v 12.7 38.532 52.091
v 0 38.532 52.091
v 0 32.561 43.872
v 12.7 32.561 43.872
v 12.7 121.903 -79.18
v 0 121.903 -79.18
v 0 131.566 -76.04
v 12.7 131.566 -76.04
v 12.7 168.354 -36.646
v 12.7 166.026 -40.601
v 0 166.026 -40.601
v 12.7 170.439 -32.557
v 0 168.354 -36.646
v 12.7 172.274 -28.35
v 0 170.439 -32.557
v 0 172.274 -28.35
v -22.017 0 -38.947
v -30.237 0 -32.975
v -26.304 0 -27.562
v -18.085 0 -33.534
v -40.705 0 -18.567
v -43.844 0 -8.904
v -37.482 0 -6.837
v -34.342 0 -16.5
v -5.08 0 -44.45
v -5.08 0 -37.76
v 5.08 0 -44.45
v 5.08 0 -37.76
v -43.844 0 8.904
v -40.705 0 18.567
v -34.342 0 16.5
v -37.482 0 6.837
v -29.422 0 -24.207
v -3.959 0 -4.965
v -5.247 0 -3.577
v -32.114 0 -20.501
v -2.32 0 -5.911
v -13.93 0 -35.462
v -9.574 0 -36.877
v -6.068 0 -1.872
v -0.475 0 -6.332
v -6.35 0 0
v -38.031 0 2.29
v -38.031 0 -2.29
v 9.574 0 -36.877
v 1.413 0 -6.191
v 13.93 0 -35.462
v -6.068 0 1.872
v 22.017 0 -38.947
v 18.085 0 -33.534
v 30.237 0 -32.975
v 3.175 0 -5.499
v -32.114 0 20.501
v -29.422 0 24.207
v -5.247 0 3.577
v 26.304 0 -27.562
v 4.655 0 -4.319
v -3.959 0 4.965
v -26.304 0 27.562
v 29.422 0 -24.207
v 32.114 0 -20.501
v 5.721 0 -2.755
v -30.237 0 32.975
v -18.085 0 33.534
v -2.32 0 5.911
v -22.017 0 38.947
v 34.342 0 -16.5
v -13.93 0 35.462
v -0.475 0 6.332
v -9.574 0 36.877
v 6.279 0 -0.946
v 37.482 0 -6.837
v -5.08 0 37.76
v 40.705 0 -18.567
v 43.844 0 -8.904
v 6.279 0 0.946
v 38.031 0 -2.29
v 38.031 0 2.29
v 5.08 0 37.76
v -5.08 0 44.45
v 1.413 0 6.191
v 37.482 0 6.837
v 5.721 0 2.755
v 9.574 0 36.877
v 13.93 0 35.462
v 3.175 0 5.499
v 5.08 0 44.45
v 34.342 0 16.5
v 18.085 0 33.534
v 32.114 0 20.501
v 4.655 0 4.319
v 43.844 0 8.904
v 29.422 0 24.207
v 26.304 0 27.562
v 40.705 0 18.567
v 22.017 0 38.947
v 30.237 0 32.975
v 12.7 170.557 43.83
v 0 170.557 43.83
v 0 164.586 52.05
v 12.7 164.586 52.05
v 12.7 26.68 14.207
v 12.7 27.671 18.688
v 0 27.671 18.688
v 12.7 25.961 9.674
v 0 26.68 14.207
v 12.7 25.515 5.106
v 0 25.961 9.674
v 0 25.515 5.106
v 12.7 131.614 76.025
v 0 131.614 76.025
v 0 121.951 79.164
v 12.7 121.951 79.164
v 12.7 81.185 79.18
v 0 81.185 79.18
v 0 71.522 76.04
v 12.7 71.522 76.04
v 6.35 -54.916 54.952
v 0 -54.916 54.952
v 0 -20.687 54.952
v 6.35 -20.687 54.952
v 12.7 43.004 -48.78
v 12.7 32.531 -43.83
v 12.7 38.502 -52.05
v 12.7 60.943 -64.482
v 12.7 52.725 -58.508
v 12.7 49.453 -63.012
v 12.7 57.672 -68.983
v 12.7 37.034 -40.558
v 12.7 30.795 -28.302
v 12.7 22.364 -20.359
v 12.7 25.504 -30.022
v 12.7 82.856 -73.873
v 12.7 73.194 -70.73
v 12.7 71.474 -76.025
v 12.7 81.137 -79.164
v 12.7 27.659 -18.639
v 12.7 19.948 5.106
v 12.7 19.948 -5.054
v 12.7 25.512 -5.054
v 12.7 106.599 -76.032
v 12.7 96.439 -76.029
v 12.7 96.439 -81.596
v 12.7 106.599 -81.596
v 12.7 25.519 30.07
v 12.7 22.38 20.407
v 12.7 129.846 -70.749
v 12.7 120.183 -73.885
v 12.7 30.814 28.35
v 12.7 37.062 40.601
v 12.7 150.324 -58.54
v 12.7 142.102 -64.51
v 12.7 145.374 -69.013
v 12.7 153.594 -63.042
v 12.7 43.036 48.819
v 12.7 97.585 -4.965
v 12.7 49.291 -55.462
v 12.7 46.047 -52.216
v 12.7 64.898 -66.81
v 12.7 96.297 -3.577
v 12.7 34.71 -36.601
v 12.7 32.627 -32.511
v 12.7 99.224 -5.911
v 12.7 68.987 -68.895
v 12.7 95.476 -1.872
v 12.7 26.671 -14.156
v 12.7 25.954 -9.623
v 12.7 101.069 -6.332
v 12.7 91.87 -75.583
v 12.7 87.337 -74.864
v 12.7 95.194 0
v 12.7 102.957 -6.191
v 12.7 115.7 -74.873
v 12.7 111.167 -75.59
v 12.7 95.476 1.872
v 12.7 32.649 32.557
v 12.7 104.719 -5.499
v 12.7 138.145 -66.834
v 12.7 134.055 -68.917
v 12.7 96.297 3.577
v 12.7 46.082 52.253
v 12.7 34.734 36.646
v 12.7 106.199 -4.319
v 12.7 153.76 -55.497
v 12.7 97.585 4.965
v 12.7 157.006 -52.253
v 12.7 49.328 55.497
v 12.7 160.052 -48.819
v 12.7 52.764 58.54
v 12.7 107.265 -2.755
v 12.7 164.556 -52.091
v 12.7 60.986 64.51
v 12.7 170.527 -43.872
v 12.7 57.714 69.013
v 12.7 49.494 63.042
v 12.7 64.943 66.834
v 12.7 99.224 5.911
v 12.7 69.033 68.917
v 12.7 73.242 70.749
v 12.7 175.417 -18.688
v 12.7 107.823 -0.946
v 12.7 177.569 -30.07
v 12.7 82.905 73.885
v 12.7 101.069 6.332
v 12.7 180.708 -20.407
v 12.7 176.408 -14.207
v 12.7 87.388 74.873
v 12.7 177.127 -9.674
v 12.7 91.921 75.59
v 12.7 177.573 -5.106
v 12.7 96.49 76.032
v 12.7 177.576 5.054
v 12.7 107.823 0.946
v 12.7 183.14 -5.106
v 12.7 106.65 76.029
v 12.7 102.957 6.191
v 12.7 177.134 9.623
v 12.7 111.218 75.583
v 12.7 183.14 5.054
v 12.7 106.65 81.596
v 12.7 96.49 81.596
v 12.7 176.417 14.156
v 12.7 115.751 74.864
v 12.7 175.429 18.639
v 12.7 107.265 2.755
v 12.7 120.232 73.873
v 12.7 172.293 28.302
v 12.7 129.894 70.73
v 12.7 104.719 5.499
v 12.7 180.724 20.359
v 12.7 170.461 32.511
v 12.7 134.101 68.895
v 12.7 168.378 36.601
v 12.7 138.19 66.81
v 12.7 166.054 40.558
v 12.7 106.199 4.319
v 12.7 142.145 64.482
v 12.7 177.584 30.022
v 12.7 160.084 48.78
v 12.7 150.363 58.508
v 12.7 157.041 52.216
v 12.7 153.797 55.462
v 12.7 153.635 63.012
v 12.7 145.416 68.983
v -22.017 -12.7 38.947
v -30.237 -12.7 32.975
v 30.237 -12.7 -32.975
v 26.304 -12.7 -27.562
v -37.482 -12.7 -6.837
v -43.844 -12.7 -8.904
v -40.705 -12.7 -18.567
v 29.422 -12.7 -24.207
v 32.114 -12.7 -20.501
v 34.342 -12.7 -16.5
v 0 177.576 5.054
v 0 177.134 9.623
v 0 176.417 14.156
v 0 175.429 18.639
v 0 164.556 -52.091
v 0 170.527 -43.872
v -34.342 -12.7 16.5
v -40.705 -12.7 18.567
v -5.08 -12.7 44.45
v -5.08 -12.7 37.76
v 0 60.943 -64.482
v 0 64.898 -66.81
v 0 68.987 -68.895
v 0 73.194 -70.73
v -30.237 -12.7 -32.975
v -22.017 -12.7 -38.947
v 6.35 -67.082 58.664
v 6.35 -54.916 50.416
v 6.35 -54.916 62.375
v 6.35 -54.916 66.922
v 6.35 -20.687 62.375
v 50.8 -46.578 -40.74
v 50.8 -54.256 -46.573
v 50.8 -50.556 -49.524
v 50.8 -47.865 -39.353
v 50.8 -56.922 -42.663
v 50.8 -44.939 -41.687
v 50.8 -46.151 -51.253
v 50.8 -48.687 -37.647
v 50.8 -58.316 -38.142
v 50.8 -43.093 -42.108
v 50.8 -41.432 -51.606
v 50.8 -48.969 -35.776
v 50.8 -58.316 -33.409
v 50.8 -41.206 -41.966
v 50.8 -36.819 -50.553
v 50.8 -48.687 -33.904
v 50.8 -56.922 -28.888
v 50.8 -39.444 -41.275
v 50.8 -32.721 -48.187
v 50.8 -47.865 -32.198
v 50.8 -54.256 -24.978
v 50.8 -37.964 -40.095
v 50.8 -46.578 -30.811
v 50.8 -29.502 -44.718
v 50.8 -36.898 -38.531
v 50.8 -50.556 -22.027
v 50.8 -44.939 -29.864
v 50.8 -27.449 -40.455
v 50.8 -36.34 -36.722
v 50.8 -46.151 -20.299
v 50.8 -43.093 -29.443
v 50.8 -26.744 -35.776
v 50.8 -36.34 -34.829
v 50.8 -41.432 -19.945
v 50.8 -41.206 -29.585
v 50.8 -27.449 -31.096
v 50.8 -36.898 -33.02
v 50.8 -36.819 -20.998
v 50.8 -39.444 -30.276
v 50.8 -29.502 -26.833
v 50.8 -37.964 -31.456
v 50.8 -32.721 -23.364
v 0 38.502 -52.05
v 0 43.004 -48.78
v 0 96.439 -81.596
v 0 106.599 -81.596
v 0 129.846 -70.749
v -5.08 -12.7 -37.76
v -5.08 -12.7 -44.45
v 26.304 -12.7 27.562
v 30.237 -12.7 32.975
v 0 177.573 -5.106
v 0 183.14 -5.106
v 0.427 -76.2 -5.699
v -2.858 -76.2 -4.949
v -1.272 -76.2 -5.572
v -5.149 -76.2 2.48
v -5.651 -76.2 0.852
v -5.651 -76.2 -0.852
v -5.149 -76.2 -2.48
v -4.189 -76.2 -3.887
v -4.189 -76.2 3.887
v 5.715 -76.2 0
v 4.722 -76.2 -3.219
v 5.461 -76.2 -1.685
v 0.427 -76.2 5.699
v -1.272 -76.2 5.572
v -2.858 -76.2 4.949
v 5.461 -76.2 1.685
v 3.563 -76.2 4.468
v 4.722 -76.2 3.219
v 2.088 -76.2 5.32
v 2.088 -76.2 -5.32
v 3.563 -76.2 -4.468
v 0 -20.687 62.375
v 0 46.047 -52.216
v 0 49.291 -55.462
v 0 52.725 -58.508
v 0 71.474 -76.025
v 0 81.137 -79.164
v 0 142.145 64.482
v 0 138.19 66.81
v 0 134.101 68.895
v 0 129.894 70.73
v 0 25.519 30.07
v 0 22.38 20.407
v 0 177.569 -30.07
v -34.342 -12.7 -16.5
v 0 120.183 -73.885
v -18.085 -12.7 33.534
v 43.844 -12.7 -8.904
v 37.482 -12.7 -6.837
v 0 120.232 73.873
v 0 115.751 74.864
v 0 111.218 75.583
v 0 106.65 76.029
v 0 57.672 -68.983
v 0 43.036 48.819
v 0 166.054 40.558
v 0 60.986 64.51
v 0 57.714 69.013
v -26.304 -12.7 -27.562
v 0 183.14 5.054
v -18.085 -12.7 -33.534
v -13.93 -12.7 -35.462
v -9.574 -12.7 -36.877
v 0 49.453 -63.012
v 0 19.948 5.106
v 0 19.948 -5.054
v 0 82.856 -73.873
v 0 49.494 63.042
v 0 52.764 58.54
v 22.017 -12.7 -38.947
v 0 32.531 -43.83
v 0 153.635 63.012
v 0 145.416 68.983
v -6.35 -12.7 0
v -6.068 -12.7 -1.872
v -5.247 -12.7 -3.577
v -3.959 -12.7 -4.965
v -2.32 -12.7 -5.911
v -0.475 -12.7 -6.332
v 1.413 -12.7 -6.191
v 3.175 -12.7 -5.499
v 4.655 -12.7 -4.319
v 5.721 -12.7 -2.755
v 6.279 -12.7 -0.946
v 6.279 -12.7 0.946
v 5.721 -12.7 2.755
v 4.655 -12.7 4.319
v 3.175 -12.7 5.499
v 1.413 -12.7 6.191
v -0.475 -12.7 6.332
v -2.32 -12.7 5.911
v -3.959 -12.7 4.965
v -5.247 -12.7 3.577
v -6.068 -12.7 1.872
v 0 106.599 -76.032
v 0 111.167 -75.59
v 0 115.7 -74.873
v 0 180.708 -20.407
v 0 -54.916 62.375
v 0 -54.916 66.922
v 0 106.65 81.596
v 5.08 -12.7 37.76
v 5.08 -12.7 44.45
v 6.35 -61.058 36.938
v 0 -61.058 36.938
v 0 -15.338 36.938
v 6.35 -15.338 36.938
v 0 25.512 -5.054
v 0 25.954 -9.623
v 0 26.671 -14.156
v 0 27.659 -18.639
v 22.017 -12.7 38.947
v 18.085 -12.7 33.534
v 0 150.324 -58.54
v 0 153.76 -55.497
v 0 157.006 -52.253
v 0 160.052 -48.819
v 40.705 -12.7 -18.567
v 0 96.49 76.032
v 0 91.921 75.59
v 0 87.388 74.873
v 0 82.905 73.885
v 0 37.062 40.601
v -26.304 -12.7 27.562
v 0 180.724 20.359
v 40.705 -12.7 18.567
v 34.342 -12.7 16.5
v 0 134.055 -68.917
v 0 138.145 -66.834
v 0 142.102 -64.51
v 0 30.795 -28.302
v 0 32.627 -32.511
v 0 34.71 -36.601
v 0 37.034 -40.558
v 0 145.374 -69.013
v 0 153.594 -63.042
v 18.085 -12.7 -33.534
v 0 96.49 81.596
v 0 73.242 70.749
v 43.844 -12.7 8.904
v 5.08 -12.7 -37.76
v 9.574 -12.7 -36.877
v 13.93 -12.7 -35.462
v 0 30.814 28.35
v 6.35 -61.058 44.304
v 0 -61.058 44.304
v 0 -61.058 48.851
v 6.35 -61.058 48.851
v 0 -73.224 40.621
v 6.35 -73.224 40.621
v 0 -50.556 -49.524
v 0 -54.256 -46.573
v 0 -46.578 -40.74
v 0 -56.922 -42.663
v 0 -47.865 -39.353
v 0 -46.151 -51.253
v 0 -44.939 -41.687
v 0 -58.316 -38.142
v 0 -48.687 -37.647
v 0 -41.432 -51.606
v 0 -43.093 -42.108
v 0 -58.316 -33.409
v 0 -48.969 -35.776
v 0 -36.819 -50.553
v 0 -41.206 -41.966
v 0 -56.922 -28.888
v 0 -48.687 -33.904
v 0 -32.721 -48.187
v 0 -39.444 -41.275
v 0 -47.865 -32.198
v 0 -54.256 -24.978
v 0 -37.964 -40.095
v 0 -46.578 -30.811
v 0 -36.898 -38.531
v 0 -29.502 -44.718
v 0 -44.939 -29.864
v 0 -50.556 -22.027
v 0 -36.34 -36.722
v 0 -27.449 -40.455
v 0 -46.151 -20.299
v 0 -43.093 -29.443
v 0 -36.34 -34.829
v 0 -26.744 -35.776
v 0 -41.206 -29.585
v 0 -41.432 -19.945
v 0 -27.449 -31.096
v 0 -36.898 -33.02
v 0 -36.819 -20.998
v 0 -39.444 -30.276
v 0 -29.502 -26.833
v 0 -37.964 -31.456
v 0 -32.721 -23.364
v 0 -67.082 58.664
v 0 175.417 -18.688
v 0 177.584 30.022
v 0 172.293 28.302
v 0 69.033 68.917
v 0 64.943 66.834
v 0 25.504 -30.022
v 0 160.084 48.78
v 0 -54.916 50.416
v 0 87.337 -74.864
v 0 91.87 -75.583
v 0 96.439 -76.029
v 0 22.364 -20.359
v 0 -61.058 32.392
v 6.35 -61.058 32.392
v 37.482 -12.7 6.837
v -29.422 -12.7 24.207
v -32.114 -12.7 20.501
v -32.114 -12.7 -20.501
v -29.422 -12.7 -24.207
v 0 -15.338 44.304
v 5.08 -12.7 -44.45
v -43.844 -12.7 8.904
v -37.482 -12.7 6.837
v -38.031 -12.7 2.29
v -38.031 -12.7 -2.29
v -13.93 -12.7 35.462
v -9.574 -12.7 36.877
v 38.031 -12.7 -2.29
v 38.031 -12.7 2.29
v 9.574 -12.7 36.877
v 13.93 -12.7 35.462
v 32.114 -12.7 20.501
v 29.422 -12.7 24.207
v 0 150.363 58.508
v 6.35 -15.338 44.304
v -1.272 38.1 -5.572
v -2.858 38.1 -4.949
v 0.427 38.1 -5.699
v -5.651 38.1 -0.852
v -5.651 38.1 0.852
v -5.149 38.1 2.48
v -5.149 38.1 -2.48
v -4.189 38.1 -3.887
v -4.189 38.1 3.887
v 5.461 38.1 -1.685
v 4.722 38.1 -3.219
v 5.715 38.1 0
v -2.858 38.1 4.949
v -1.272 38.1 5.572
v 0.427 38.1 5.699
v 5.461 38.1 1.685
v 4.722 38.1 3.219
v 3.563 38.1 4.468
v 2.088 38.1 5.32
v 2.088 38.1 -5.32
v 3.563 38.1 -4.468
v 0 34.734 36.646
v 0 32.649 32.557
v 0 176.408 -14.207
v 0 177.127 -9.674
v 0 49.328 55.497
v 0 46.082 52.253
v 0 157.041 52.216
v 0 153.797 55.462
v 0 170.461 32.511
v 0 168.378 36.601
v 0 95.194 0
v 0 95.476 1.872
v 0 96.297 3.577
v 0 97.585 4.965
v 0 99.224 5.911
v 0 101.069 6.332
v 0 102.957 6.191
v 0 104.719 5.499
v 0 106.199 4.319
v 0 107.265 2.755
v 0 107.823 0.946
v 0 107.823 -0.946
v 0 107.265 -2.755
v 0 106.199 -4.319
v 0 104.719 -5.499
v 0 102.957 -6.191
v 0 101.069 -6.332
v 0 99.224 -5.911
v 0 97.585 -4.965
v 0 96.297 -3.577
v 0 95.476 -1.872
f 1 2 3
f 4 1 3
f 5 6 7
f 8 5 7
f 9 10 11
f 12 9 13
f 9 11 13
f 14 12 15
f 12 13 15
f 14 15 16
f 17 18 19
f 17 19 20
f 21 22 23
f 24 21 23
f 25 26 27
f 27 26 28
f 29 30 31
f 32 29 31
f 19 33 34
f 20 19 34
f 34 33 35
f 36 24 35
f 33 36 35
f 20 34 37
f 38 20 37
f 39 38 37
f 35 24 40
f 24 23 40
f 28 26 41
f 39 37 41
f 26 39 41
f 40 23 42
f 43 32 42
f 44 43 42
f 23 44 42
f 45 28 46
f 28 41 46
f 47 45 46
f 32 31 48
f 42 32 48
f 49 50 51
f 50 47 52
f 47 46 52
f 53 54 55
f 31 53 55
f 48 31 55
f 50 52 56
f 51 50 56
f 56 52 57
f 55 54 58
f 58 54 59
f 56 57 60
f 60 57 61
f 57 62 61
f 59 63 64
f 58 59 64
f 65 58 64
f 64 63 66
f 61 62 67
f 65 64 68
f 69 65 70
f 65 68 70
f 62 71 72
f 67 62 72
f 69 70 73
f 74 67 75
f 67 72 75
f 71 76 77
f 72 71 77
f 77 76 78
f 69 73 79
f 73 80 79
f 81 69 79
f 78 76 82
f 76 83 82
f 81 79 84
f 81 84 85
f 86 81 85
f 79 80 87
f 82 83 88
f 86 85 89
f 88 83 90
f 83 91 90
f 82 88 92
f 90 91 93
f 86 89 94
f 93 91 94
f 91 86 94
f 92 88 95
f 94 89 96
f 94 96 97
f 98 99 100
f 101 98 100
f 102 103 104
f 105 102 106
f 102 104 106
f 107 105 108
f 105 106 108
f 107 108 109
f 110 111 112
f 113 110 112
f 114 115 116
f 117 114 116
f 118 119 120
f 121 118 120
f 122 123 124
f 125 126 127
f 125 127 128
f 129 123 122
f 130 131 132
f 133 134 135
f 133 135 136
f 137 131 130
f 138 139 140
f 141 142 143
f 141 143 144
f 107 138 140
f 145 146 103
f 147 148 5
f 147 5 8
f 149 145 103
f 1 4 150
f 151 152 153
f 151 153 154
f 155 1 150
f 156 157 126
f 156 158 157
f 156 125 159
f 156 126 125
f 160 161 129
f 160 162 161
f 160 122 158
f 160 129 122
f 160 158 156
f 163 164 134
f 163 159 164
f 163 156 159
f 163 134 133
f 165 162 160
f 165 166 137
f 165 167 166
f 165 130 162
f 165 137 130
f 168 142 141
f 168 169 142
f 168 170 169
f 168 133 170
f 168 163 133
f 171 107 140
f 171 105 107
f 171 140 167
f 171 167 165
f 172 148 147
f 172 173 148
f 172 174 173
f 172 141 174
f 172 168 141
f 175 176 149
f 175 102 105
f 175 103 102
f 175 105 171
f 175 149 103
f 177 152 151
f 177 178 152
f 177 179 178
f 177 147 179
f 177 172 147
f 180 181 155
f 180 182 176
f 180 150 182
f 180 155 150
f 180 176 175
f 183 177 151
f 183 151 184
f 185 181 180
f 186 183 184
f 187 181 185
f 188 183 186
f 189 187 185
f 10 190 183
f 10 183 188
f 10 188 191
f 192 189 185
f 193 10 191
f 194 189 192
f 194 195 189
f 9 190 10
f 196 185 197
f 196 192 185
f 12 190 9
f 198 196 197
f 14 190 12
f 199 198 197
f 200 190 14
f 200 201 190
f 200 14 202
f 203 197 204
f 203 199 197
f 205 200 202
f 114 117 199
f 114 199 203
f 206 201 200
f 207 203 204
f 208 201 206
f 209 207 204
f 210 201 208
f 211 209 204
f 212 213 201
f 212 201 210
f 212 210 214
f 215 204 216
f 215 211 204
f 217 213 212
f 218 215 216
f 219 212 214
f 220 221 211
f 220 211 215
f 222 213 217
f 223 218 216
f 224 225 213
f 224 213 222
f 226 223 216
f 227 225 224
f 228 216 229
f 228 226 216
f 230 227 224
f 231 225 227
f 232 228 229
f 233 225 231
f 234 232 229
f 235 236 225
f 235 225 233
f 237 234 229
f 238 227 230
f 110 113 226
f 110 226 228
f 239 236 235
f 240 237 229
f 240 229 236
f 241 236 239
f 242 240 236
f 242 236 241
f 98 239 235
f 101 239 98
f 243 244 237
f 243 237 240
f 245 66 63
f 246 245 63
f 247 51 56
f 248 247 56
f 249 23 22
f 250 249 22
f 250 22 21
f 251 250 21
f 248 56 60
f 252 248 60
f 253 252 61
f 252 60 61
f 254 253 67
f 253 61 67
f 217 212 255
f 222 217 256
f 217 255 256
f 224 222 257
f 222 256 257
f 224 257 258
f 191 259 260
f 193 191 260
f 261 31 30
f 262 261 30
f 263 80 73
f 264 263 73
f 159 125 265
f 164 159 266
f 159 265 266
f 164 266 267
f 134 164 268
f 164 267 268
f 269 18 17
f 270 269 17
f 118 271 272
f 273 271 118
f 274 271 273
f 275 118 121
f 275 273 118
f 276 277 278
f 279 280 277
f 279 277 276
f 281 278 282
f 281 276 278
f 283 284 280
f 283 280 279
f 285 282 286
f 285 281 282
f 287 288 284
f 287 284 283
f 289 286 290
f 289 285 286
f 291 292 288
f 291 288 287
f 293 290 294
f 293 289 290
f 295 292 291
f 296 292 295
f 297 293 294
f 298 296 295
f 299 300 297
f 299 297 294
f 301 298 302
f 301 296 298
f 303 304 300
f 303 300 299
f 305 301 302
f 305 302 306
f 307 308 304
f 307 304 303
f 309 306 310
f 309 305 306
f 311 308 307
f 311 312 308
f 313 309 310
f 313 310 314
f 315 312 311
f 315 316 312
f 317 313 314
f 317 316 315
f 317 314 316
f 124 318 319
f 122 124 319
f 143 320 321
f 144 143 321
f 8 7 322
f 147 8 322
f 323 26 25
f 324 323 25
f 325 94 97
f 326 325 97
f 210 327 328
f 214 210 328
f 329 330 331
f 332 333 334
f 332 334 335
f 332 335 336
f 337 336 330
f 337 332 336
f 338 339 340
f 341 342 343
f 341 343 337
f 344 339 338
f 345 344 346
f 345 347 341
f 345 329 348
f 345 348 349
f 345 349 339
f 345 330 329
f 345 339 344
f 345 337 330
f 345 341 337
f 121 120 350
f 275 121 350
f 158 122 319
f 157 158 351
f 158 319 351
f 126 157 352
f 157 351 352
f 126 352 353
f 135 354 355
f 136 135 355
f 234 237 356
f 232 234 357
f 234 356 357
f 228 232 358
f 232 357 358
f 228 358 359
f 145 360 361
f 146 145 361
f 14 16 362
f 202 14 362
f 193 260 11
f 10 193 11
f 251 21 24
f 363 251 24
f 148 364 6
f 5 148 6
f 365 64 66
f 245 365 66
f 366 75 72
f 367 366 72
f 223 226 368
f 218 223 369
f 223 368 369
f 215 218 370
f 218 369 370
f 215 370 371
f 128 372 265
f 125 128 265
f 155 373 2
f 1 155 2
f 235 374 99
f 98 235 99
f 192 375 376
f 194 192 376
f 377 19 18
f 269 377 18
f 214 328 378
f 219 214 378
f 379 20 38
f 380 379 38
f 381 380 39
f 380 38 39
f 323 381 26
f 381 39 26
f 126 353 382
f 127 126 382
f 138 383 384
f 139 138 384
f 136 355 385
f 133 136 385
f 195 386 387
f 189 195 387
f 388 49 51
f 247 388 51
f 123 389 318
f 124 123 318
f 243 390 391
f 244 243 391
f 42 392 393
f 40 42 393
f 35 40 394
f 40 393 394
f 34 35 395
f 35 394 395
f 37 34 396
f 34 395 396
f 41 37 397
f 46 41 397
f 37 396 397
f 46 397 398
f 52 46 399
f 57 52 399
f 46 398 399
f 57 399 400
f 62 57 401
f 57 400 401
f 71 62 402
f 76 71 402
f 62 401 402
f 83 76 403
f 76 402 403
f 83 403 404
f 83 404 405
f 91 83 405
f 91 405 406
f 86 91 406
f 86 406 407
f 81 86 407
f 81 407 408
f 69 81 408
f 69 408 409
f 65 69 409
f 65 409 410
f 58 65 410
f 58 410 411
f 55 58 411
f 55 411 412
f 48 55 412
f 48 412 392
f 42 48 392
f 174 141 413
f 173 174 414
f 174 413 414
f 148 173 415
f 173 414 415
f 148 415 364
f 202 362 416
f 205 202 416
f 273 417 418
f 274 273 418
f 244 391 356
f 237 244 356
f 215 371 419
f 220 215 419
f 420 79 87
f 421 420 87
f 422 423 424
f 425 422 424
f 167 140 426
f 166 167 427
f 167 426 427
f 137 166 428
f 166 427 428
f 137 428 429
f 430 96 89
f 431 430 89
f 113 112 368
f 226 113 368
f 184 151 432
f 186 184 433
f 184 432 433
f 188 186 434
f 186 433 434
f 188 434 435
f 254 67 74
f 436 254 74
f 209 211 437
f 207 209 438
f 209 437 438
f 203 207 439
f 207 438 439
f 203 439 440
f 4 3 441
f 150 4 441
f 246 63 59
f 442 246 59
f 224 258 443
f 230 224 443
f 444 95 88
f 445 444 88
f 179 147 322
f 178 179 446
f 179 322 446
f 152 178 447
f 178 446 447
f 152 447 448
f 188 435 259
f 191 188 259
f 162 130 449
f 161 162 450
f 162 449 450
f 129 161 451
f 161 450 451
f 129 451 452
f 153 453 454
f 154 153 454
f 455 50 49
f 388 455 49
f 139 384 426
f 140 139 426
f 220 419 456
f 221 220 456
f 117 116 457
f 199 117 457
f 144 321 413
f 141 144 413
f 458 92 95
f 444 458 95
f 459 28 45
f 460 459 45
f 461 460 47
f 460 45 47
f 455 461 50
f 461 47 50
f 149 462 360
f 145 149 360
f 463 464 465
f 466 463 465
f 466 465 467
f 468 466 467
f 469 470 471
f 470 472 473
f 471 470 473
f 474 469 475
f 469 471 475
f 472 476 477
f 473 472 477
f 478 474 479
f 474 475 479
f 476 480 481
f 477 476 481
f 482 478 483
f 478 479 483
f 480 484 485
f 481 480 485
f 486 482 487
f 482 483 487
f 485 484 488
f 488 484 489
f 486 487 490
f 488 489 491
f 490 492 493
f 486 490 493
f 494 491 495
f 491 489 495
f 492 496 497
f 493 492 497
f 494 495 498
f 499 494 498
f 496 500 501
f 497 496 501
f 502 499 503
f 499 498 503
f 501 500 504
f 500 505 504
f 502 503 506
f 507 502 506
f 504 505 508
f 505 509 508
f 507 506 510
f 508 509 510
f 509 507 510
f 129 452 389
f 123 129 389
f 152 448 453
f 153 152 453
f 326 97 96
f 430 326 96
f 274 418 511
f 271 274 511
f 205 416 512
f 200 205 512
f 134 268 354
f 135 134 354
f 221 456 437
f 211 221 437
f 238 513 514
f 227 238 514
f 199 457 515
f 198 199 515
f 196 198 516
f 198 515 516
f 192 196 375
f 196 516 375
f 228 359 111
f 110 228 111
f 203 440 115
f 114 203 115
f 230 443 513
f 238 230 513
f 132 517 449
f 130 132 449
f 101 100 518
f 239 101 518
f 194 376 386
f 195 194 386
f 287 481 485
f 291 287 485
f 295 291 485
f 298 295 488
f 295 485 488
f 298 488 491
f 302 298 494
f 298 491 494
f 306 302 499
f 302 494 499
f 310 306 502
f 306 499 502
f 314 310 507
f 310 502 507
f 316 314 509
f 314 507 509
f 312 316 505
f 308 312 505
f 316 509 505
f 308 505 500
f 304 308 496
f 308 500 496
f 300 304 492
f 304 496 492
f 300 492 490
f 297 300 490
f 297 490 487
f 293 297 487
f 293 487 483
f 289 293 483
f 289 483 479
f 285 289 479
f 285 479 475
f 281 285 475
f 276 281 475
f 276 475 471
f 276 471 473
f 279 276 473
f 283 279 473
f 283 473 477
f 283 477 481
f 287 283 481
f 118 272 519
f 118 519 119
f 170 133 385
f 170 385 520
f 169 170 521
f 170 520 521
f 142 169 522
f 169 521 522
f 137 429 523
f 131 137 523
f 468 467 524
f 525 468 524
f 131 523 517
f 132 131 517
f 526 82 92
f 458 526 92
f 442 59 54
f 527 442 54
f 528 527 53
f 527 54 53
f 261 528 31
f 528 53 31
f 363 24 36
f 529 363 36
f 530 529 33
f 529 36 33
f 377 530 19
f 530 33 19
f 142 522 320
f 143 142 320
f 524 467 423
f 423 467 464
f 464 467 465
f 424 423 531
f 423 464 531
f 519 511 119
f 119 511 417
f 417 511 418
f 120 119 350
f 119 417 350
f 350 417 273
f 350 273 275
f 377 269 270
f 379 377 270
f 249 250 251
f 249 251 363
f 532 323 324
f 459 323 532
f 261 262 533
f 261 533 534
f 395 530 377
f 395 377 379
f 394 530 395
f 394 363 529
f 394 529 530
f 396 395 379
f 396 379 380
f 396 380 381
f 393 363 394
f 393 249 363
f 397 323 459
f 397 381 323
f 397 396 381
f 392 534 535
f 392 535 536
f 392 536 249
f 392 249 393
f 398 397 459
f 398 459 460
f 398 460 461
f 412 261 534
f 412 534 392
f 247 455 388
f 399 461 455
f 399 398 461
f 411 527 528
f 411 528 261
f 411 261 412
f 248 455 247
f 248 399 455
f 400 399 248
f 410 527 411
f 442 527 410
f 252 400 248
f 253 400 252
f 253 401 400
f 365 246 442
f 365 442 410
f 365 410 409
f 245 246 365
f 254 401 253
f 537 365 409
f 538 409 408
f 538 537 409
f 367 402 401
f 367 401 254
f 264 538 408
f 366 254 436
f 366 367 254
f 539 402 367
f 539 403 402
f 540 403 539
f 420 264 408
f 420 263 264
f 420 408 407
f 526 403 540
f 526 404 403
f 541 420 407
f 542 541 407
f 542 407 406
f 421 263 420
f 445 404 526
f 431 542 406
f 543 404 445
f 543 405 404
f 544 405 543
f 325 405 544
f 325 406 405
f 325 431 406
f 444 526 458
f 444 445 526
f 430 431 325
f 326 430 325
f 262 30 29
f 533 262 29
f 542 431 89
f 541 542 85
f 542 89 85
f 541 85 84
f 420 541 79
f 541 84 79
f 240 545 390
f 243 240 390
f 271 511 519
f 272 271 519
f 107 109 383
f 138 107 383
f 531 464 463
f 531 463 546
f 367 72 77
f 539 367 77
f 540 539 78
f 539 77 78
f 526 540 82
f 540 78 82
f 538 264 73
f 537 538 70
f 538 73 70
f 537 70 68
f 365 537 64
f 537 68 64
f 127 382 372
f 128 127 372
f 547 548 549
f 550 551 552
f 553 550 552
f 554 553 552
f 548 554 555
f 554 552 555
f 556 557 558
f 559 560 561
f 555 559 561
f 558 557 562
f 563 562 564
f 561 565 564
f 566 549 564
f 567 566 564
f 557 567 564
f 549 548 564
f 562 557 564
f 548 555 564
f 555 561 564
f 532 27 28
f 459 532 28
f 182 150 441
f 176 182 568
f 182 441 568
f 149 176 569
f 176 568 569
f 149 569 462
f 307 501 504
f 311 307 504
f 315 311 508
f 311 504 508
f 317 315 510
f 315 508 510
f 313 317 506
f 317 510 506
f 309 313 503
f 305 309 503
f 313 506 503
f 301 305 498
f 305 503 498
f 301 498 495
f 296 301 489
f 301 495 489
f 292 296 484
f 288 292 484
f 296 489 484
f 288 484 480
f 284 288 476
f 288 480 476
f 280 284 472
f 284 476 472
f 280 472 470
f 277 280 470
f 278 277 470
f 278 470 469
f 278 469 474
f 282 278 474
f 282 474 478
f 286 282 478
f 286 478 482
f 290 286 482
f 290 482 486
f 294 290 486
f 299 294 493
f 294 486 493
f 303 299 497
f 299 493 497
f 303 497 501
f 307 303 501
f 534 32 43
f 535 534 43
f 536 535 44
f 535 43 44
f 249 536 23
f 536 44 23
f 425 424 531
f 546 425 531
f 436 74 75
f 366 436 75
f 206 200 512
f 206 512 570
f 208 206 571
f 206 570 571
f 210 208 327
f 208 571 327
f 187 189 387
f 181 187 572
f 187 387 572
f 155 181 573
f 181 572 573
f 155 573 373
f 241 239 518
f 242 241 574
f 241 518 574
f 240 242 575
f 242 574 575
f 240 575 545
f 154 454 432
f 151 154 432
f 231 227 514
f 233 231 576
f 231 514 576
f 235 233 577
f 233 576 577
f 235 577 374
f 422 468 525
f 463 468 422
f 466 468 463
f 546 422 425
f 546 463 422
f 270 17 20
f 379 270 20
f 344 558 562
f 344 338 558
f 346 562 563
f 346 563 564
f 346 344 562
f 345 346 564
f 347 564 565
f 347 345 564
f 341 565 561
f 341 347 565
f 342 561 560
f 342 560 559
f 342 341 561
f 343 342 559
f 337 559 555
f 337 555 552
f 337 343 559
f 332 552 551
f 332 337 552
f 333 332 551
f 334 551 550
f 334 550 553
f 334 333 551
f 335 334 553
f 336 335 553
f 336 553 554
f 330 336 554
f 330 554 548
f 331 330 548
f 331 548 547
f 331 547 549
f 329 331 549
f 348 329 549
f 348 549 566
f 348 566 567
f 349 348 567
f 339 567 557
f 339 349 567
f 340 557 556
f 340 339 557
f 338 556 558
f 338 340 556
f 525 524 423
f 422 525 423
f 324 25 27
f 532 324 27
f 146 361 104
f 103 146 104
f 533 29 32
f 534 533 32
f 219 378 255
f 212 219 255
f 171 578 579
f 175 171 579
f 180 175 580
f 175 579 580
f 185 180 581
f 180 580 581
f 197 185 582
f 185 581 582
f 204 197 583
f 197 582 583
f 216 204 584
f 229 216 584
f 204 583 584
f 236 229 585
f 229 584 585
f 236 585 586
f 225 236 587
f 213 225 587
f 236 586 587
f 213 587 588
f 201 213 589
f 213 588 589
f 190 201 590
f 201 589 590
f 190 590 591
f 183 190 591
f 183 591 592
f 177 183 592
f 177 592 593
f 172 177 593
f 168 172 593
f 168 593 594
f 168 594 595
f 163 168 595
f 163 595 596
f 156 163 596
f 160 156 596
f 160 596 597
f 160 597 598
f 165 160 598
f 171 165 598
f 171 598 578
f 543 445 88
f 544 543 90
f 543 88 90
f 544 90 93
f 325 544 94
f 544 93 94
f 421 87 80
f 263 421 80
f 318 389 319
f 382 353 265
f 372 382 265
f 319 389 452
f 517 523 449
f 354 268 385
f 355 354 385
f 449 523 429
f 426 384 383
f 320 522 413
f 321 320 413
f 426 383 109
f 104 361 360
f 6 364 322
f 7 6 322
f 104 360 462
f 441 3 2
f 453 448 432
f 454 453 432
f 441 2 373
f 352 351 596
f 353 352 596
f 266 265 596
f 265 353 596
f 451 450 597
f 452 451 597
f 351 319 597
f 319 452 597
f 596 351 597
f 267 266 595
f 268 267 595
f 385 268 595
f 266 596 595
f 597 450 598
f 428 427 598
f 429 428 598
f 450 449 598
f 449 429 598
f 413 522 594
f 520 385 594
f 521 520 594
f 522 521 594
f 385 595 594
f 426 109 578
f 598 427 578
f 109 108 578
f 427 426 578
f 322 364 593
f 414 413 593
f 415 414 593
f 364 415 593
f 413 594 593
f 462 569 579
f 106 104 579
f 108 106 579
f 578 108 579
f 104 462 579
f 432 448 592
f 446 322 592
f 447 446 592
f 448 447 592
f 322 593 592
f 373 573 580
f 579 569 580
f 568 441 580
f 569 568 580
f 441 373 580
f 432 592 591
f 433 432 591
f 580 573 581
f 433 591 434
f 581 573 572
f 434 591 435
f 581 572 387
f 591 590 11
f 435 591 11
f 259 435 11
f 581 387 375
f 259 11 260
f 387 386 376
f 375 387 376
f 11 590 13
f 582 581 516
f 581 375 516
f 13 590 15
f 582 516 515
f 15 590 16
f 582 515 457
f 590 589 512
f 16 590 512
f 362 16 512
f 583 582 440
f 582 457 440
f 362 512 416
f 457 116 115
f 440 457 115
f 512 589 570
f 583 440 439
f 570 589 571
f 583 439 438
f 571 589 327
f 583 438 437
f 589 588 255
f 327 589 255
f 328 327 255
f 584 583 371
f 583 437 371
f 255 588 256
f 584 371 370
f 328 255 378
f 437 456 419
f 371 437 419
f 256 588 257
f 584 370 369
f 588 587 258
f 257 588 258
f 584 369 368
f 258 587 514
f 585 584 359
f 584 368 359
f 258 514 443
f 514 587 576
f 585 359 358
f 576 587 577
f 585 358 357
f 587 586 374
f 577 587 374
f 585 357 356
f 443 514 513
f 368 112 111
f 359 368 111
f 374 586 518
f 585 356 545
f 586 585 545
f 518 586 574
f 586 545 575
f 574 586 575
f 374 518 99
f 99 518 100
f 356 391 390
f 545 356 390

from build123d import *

# Parameters (mm, degrees)
F0_R           = 38.1
F2_DEPTH       = 12.7
F3_COUNT       = 10
F4_D           = 12.7
F6_R           = 76.2
F8_DEPTH       = 12.7
F9_COUNT       = 20
F12_D          = 12.7
F13_R          = 5.715
F14_DEPTH      = 63.5
F14_DEPTH_BACK = 50.8
F15_W          = 34.2290457338
F15_H          = 7.4231624603
F16_DEPTH      = 6.35
F17_R          = 15.875
F18_DEPTH      = 50.8
F20_D          = 12.7
F21_W          = 45.72
F21_H          = 7.366
F22_DEPTH      = 6.35


with BuildPart() as f2:
    # F0 (on Front) → F2 (new body)
    with BuildSketch(Plane.XZ):
        Circle(F0_R)
    extrude(amount=F2_DEPTH)

    # F4 (through all)
    with Locations(Plane(origin=(0, 0, 0), x_dir=(1, 0, 0), z_dir=(0, 1, 0))):
        with Locations((0, 0)):
            Hole(F4_D / 2)


with BuildPart() as f2b:
    # F1 (on face) → F2, piece 2 (new body)
    with BuildSketch(Plane.XZ):
        with BuildLine():
            Line((-5.08, 44.45), (-5.08, 37.7598146182))
            ThreePointArc((-5.08, 37.7598146182), (0, 38.1), (5.08, 37.7598146182))
            Line((5.08, 37.7598146182), (5.08, 44.45))
            Line((5.08, 44.45), (-5.08, 44.45))
        make_face()
    extrude(amount=F2_DEPTH)


with BuildPart() as f3_1:
    # F3: instance of F2b
    add(f2b.part.rotate(Axis((0, 0, 0), (0, -1, 0)), 1 * 360 / F3_COUNT))


with BuildPart() as f3_2:
    # F3: instance of F2b
    add(f2b.part.rotate(Axis((0, 0, 0), (0, -1, 0)), 2 * 360 / F3_COUNT))


with BuildPart() as f3_3:
    # F3: instance of F2b
    add(f2b.part.rotate(Axis((0, 0, 0), (0, -1, 0)), 3 * 360 / F3_COUNT))


with BuildPart() as f3_4:
    # F3: instance of F2b
    add(f2b.part.rotate(Axis((0, 0, 0), (0, -1, 0)), 4 * 360 / F3_COUNT))


with BuildPart() as f3_5:
    # F3: instance of F2b
    add(f2b.part.rotate(Axis((0, 0, 0), (0, -1, 0)), 5 * 360 / F3_COUNT))


with BuildPart() as f3_6:
    # F3: instance of F2b
    add(f2b.part.rotate(Axis((0, 0, 0), (0, -1, 0)), 6 * 360 / F3_COUNT))


with BuildPart() as f3_7:
    # F3: instance of F2b
    add(f2b.part.rotate(Axis((0, 0, 0), (0, -1, 0)), 7 * 360 / F3_COUNT))


with BuildPart() as f3_8:
    # F3: instance of F2b
    add(f2b.part.rotate(Axis((0, 0, 0), (0, -1, 0)), 8 * 360 / F3_COUNT))


with BuildPart() as f3_9:
    # F3: instance of F2b
    add(f2b.part.rotate(Axis((0, 0, 0), (0, -1, 0)), 9 * 360 / F3_COUNT))


with BuildPart() as f2b_1:
    add(f2b.part)

    # F5: union F3_2, F3_1, F3_3, F3_4, F3_5, F3_6, F3_7, F3_8, F3_9, F2
    add(f3_2.part)
    add(f3_1.part)
    add(f3_3.part)
    add(f3_4.part)
    add(f3_5.part)
    add(f3_6.part)
    add(f3_7.part)
    add(f3_8.part)
    add(f3_9.part)
    add(f2.part)


with BuildPart() as f8:
    # F6 (on Right) → F8 (new body)
    with BuildSketch(Plane.YZ):
        with Locations((101.5440017082, 0)):
            Circle(F6_R)
    extrude(amount=F8_DEPTH)


with BuildPart() as f8b:
    # F7 (on face) → F8, piece 2 (new body)
    with BuildSketch(Plane.YZ):
        with BuildLine():
            Line((96.4895019979, 81.5958976746), (96.4895019979, 76.0321776137))
            ThreePointArc((96.4895019979, 76.0321776137), (101.5695588549, 76.1999957141), (106.6495019979, 76.0287699939))
            Line((106.6495019979, 76.0287699939), (106.6495019979, 81.5958976746))
            Line((106.6495019979, 81.5958976746), (96.4895019979, 81.5958976746))
        make_face()
    extrude(amount=F8_DEPTH)


with BuildPart() as f9_1:
    # F9: instance of F8b
    add(f8b.part.rotate(Axis((12.7, 101.5440017082, 0), (1, 0, 0)), 1 * 360 / F9_COUNT))


with BuildPart() as f9_2:
    # F9: instance of F8b
    add(f8b.part.rotate(Axis((12.7, 101.5440017082, 0), (1, 0, 0)), 2 * 360 / F9_COUNT))


with BuildPart() as f9_3:
    # F9: instance of F8b
    add(f8b.part.rotate(Axis((12.7, 101.5440017082, 0), (1, 0, 0)), 3 * 360 / F9_COUNT))


with BuildPart() as f9_4:
    # F9: instance of F8b
    add(f8b.part.rotate(Axis((12.7, 101.5440017082, 0), (1, 0, 0)), 4 * 360 / F9_COUNT))


with BuildPart() as f9_5:
    # F9: instance of F8b
    add(f8b.part.rotate(Axis((12.7, 101.5440017082, 0), (1, 0, 0)), 5 * 360 / F9_COUNT))


with BuildPart() as f9_6:
    # F9: instance of F8b
    add(f8b.part.rotate(Axis((12.7, 101.5440017082, 0), (1, 0, 0)), 6 * 360 / F9_COUNT))


with BuildPart() as f9_7:
    # F9: instance of F8b
    add(f8b.part.rotate(Axis((12.7, 101.5440017082, 0), (1, 0, 0)), 7 * 360 / F9_COUNT))


with BuildPart() as f9_8:
    # F9: instance of F8b
    add(f8b.part.rotate(Axis((12.7, 101.5440017082, 0), (1, 0, 0)), 8 * 360 / F9_COUNT))


with BuildPart() as f9_9:
    # F9: instance of F8b
    add(f8b.part.rotate(Axis((12.7, 101.5440017082, 0), (1, 0, 0)), 9 * 360 / F9_COUNT))


with BuildPart() as f9_10:
    # F9: instance of F8b
    add(f8b.part.rotate(Axis((12.7, 101.5440017082, 0), (1, 0, 0)), 10 * 360 / F9_COUNT))


with BuildPart() as f9_11:
    # F9: instance of F8b
    add(f8b.part.rotate(Axis((12.7, 101.5440017082, 0), (1, 0, 0)), 11 * 360 / F9_COUNT))


with BuildPart() as f9_12:
    # F9: instance of F8b
    add(f8b.part.rotate(Axis((12.7, 101.5440017082, 0), (1, 0, 0)), 12 * 360 / F9_COUNT))


with BuildPart() as f9_13:
    # F9: instance of F8b
    add(f8b.part.rotate(Axis((12.7, 101.5440017082, 0), (1, 0, 0)), 13 * 360 / F9_COUNT))


with BuildPart() as f9_14:
    # F9: instance of F8b
    add(f8b.part.rotate(Axis((12.7, 101.5440017082, 0), (1, 0, 0)), 14 * 360 / F9_COUNT))


with BuildPart() as f9_15:
    # F9: instance of F8b
    add(f8b.part.rotate(Axis((12.7, 101.5440017082, 0), (1, 0, 0)), 15 * 360 / F9_COUNT))


with BuildPart() as f9_16:
    # F9: instance of F8b
    add(f8b.part.rotate(Axis((12.7, 101.5440017082, 0), (1, 0, 0)), 16 * 360 / F9_COUNT))


with BuildPart() as f9_17:
    # F9: instance of F8b
    add(f8b.part.rotate(Axis((12.7, 101.5440017082, 0), (1, 0, 0)), 17 * 360 / F9_COUNT))


with BuildPart() as f9_18:
    # F9: instance of F8b
    add(f8b.part.rotate(Axis((12.7, 101.5440017082, 0), (1, 0, 0)), 18 * 360 / F9_COUNT))


with BuildPart() as f9_19:
    # F9: instance of F8b
    add(f8b.part.rotate(Axis((12.7, 101.5440017082, 0), (1, 0, 0)), 19 * 360 / F9_COUNT))


with BuildPart() as f9_1_1:
    add(f9_1.part)

    # F10: union F9_2, F8, F8b, F9_9, F9_8, F9_7, F9_6, F9_5, F9_4, F9_3, F9_19, F9_18, F9_17, F9_16, F9_15, F9_14, F9_13, F9_12, F9_11, F9_10
    add(f9_2.part)
    add(f8.part)
    add(f8b.part)
    add(f9_9.part)
    add(f9_8.part)
    add(f9_7.part)
    add(f9_6.part)
    add(f9_5.part)
    add(f9_4.part)
    add(f9_3.part)
    add(f9_19.part)
    add(f9_18.part)
    add(f9_17.part)
    add(f9_16.part)
    add(f9_15.part)
    add(f9_14.part)
    add(f9_13.part)
    add(f9_12.part)
    add(f9_11.part)
    add(f9_10.part)

    # F12 (through all)
    with Locations(Plane.YZ.offset(12.7)):
        with Locations((101.5440017082, 0)):
            Hole(F12_D / 2)


with BuildPart() as f14:
    # F13 (on face) → F14 (new body, two sides)
    with BuildSketch(Plane.XZ.offset(12.7)) as f14_sk:
        Circle(F13_R)
    extrude(amount=F14_DEPTH)
    extrude(f14_sk.sketch, amount=-F14_DEPTH_BACK)


with BuildPart() as f16:
    # F15 (on Right) → F16 (new body)
    with BuildSketch(Plane.YZ):
        with Locations((-37.8016689792, 58.6636215448)):
            Rectangle(F15_W, F15_H)
        Polygon((-54.9161918461, 54.9520403147), (-54.9161918461, 62.375202775), (-54.9161918461, 66.921802775), (-67.0819282532, 58.6636215448), (-54.9161918461, 50.4156574607), align=None)
    extrude(amount=F16_DEPTH)


with BuildPart() as f18:
    # F17 (on Right) → F18 (new body)
    with BuildSketch(Plane.YZ):
        with Locations((-42.6187925041, -35.7755310833)):
            Circle(F17_R)
    extrude(amount=F18_DEPTH)

    # F20 (through all)
    with Locations(Plane.YZ.offset(50.8)):
        with Locations((-42.6187925041, -35.7755310833)):
            Hole(F20_D / 2)


with BuildPart() as f22:
    # F21 (on Right) → F22 (new body)
    with BuildSketch(Plane.YZ):
        with Locations((-38.1975783284, 40.621208027)):
            Rectangle(F21_W, F21_H)
        Polygon((-61.0575783284, 36.938208027), (-61.0575783284, 44.304208027), (-61.0575783284, 48.850808027), (-73.2241783284, 40.621208027), (-61.0575783284, 32.391608027), align=None)
    extrude(amount=F22_DEPTH)


solid = Compound([f2b_1.part, f9_1_1.part, f14.part, f16.part, f18.part, f22.part])
